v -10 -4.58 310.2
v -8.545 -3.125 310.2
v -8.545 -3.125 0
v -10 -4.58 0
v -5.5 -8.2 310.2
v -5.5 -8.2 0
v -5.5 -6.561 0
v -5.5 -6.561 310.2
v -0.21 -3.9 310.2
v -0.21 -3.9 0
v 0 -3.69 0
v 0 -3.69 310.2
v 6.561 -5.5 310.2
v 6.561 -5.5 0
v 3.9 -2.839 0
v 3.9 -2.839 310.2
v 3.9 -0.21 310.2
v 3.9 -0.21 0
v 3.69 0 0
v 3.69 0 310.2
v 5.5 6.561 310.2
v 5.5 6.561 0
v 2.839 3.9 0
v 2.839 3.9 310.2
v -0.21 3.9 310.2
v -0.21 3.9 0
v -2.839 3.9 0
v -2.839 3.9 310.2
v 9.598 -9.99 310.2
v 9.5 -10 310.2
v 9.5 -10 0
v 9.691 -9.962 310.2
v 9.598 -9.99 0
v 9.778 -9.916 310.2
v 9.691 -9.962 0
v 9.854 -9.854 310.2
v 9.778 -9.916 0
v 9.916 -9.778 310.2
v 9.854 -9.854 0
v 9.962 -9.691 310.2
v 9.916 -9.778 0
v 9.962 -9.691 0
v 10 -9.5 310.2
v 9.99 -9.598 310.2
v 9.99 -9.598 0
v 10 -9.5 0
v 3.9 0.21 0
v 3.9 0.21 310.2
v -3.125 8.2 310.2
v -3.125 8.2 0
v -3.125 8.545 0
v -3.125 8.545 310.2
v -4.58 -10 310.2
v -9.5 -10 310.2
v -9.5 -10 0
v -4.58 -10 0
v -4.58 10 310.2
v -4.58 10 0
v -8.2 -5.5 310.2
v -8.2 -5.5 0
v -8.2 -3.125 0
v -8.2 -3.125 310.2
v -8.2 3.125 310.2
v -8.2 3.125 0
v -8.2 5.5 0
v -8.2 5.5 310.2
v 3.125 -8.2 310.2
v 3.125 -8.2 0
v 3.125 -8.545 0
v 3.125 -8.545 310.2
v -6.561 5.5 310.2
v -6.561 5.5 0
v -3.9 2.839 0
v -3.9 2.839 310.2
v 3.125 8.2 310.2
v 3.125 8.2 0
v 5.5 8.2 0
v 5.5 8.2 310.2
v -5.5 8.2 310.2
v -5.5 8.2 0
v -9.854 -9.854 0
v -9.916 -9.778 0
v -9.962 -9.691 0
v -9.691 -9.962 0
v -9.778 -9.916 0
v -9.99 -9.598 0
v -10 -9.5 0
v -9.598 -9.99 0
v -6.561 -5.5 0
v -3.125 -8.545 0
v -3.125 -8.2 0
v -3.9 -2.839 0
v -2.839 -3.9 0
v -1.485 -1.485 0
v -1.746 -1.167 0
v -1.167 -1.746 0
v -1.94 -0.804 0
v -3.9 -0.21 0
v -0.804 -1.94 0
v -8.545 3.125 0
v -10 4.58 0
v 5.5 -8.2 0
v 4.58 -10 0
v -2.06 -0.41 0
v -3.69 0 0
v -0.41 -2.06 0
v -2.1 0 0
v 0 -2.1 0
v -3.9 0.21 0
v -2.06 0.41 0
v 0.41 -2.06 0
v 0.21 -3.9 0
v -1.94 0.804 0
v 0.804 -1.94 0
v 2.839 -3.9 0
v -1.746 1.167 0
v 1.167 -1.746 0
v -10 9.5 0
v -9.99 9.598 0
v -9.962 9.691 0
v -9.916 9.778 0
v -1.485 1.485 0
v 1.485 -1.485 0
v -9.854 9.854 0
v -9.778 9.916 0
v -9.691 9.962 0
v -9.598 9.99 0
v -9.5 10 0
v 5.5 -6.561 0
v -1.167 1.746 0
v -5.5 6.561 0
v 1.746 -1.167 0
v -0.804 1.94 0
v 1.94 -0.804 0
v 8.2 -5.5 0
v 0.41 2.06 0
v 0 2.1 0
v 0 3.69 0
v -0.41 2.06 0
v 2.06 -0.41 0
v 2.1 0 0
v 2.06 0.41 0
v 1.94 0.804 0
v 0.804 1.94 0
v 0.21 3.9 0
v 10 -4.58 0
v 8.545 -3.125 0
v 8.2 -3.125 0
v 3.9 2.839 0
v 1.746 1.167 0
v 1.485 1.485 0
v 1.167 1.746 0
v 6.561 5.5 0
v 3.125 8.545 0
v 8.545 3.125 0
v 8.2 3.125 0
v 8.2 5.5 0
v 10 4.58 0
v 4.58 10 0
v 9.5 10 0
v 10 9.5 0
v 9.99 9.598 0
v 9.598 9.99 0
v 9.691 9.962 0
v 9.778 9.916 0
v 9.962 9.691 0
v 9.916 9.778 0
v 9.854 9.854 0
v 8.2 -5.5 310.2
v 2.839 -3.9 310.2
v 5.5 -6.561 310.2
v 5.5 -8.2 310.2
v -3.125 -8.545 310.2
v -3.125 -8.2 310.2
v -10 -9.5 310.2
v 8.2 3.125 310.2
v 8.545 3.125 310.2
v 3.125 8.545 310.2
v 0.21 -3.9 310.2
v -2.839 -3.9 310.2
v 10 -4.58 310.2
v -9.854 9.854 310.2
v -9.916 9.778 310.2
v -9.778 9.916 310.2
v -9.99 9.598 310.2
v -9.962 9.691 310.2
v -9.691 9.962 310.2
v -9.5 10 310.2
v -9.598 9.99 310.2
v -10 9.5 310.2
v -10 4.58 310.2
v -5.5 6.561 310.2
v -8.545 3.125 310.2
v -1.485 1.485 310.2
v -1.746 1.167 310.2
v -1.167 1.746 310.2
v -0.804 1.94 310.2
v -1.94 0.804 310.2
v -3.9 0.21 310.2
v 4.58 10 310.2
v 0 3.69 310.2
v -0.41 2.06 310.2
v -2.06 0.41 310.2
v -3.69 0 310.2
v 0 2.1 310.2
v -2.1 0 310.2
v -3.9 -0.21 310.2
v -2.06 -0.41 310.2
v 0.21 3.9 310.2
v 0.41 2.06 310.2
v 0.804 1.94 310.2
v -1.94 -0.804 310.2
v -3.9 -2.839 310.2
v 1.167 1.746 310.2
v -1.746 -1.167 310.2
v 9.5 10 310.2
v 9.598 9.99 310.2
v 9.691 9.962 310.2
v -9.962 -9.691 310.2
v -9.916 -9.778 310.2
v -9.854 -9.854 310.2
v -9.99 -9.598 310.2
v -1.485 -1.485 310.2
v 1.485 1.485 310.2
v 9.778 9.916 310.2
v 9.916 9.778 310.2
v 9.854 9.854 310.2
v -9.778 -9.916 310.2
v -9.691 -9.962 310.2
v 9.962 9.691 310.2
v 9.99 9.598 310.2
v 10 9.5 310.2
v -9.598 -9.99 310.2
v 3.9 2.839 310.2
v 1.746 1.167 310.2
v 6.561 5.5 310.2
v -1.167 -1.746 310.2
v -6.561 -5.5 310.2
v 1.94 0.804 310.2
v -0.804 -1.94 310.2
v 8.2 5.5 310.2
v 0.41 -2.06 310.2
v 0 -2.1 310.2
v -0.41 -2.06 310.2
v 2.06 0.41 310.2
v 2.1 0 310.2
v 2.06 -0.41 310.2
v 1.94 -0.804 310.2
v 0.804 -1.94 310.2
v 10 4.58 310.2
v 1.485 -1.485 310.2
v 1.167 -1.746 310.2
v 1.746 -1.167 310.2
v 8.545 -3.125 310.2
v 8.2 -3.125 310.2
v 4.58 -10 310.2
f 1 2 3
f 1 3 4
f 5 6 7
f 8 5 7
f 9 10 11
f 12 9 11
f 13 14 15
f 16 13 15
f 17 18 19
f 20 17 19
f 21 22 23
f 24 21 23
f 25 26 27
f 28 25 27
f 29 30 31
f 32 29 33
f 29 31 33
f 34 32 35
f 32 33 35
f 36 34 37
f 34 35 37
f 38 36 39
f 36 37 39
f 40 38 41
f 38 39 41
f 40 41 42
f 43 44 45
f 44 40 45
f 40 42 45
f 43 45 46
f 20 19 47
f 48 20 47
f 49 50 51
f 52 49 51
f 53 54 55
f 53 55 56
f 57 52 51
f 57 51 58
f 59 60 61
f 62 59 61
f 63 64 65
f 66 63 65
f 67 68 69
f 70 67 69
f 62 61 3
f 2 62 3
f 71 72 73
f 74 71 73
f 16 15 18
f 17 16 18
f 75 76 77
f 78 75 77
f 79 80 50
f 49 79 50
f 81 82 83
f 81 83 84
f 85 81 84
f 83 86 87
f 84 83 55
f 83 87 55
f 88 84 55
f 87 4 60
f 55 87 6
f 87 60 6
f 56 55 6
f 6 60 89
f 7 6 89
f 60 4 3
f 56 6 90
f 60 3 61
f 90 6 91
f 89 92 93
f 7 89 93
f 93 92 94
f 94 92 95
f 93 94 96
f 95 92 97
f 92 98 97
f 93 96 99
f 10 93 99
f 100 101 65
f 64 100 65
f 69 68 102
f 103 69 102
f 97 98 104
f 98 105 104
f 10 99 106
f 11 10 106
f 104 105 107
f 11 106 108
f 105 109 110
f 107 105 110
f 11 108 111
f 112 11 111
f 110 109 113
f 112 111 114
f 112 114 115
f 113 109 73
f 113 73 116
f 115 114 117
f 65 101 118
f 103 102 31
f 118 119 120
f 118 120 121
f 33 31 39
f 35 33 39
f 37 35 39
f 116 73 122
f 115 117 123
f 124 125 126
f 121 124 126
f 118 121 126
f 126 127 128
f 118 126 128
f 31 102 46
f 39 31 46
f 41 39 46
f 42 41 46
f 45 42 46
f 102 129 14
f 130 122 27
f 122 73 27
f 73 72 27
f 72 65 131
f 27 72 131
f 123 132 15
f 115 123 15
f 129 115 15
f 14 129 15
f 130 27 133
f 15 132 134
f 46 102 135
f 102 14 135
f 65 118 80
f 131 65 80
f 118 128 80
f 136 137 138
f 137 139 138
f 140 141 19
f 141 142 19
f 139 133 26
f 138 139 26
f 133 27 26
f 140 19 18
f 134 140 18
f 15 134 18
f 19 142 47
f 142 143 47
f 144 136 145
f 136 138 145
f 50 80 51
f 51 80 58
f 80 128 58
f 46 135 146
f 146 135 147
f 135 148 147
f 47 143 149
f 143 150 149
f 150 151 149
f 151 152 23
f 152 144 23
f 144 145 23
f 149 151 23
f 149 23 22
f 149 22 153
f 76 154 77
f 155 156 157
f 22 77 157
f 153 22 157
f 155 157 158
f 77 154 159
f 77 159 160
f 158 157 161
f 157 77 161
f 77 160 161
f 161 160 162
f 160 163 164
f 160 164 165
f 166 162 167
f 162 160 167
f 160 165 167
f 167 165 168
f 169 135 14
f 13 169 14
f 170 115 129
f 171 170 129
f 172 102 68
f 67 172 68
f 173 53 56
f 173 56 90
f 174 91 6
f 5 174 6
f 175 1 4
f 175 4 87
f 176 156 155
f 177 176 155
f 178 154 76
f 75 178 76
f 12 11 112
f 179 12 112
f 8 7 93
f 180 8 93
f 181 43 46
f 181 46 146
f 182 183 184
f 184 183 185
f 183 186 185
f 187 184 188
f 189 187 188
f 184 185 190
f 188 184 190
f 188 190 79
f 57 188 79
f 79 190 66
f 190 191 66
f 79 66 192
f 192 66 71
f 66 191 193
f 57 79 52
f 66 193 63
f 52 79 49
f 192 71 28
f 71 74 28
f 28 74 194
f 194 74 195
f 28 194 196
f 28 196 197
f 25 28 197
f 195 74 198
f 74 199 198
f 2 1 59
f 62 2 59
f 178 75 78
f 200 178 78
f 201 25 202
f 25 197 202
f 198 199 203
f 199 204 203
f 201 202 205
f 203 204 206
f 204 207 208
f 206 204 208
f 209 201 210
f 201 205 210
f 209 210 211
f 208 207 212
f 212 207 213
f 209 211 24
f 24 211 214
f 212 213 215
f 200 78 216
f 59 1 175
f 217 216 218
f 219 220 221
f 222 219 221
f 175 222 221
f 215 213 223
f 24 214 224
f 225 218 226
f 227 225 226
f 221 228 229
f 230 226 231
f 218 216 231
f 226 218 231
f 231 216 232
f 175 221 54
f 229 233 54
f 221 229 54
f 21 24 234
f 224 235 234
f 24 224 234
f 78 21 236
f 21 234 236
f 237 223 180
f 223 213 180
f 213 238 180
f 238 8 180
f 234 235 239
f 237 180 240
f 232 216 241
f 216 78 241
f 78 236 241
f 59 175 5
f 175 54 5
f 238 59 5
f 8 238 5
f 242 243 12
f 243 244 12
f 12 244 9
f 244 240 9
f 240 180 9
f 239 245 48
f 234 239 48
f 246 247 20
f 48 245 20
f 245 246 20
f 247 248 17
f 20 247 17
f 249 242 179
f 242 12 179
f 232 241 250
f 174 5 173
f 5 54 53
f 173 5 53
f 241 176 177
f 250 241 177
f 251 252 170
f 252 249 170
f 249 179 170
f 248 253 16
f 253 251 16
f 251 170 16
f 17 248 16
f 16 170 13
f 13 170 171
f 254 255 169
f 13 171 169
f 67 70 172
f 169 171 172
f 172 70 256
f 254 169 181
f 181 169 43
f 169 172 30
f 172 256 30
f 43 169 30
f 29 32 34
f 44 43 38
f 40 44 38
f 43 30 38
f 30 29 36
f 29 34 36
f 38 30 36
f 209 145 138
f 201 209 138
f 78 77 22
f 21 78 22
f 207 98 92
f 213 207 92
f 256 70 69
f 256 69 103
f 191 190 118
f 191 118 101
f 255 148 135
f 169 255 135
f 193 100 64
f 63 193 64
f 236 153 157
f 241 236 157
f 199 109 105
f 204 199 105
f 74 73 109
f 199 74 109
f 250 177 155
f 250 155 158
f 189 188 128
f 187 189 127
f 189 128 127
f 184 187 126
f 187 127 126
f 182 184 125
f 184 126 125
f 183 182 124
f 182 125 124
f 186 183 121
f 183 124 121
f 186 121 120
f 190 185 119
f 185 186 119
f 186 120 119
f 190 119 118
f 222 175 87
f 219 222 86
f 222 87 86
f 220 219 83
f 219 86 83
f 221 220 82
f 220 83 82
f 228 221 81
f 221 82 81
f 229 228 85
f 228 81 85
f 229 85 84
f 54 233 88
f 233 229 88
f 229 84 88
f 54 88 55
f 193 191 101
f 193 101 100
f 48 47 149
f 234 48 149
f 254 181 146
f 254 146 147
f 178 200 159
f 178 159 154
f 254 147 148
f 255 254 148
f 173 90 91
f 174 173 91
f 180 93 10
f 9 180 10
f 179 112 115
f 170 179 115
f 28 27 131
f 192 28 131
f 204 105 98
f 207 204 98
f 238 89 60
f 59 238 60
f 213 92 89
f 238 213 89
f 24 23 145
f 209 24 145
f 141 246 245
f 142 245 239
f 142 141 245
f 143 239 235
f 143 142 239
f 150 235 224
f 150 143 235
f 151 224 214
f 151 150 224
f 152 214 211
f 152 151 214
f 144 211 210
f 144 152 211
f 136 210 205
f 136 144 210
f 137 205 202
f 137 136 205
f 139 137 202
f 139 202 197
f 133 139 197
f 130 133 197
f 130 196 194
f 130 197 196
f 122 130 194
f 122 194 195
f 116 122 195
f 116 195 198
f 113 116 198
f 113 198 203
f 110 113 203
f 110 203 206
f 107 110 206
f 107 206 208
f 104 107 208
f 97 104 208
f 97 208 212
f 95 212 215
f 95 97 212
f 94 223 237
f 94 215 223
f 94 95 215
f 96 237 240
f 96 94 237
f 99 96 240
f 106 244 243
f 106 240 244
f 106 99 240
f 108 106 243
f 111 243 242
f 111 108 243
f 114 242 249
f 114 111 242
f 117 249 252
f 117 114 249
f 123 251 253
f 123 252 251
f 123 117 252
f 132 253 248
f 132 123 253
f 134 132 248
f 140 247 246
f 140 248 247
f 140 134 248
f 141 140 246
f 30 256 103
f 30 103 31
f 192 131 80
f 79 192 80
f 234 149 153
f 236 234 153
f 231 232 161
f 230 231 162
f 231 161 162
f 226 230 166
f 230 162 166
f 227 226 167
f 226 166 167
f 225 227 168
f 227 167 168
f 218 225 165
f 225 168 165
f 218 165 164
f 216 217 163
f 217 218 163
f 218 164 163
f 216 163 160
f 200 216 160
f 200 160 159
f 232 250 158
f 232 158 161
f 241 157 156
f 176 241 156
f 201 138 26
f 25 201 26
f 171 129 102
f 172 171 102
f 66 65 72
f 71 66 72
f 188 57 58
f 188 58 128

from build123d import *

# Parameters (mm, degrees)
V_SLOT_20X20X500_LINEAR_RAIL_BOSS_2_R        = 2.1
V_SLOT_20X20X500_LINEAR_RAIL_BOSS_EXTR_DEPTH = 500
CUT_EXTRUDE1_DEPTH                           = 501.199960016
CUT_EXTRUDE1_DEPTH_BACK                      = 501.199960016
SKETCH1_OUTSIDE_W                            = 122.16
SKETCH1_OUTSIDE_H                            = 602.16
SKETCH1_OUTSIDE_W_2                          = 105.529320626
SKETCH1_OUTSIDE_H_2                          = 310.200000001


# Read off the part's stored shape, not the designer's step: <V-Slot 20x20x500 Linear Rail>-<Boss-Extrude1>
with BuildPart() as part:
    # V-Slot 20x20x500 Linear Rail_-_Boss- 2 → <V-Slot 20x20x500 Linear Rail>-<Boss-Extrude1> (new body)
    with BuildSketch(Plane.XY):
        with BuildLine():
            Line((3.9, -2.839339828), (3.9, -0.21))
            Line((3.9, -0.21), (3.69, 0))
            Line((3.69, 0), (3.9, 0.21))
            Line((3.9, 0.21), (3.9, 2.839339828))
            Line((3.9, 2.839339828), (6.560660172, 5.5))
            Line((6.560660172, 5.5), (8.2, 5.5))
            Line((8.2, 5.5), (8.2, 3.125))
            Line((8.2, 3.125), (8.545, 3.125))
            Line((8.545, 3.125), (10, 4.58))
            Line((10, 4.58), (10, 9.5))
            ThreePointArc((10, 9.5), (9.853553391, 9.853553391), (9.5, 10))
            Line((9.5, 10), (4.58, 10))
            Line((4.58, 10), (3.125, 8.545))
            Line((3.125, 8.545), (3.125, 8.2))
            Line((3.125, 8.2), (5.5, 8.2))
            Line((5.5, 8.2), (5.5, 6.560660172))
            Line((5.5, 6.560660172), (2.839339828, 3.9))
            Line((2.839339828, 3.9), (0.21, 3.9))
            Line((0.21, 3.9), (0, 3.69))
            Line((0, 3.69), (-0.21, 3.9))
            Line((-0.21, 3.9), (-2.839339828, 3.9))
            Line((-2.839339828, 3.9), (-5.5, 6.560660172))
            Line((-5.5, 6.560660172), (-5.5, 8.2))
            Line((-5.5, 8.2), (-3.125, 8.2))
            Line((-3.125, 8.2), (-3.125, 8.545))
            Line((-3.125, 8.545), (-4.58, 10))
            Line((-4.58, 10), (-9.5, 10))
            ThreePointArc((-9.5, 10), (-9.853553391, 9.853553391), (-10, 9.5))
            Line((-10, 9.5), (-10, 4.58))
            Line((-10, 4.58), (-8.545, 3.125))
            Line((-8.545, 3.125), (-8.2, 3.125))
            Line((-8.2, 3.125), (-8.2, 5.5))
            Line((-8.2, 5.5), (-6.560660172, 5.5))
            Line((-6.560660172, 5.5), (-3.9, 2.839339828))
            Line((-3.9, 2.839339828), (-3.9, 0.21))
            Line((-3.9, 0.21), (-3.69, 0))
            Line((-3.69, 0), (-3.9, -0.21))
            Line((-3.9, -0.21), (-3.9, -2.839339828))
            Line((-3.9, -2.839339828), (-6.560660172, -5.5))
            Line((-6.560660172, -5.5), (-8.2, -5.5))
            Line((-8.2, -5.5), (-8.2, -3.125))
            Line((-8.2, -3.125), (-8.545, -3.125))
            Line((-8.545, -3.125), (-10, -4.58))
            Line((-10, -4.58), (-10, -9.5))
            ThreePointArc((-10, -9.5), (-9.853553391, -9.853553391), (-9.5, -10))
            Line((-9.5, -10), (-4.58, -10))
            Line((-4.58, -10), (-3.125, -8.545))
            Line((-3.125, -8.545), (-3.125, -8.2))
            Line((-3.125, -8.2), (-5.5, -8.2))
            Line((-5.5, -8.2), (-5.5, -6.560660172))
            Line((-5.5, -6.560660172), (-2.839339828, -3.9))
            Line((-2.839339828, -3.9), (-0.21, -3.9))
            Line((-0.21, -3.9), (0, -3.69))
            Line((0, -3.69), (0.21, -3.9))
            Line((0.21, -3.9), (2.839339828, -3.9))
            Line((2.839339828, -3.9), (5.5, -6.560660172))
            Line((5.5, -6.560660172), (5.5, -8.2))
            Line((5.5, -8.2), (3.125, -8.2))
            Line((3.125, -8.2), (3.125, -8.545))
            Line((3.125, -8.545), (4.58, -10))
            Line((4.58, -10), (9.5, -10))
            ThreePointArc((9.5, -10), (9.853553391, -9.853553391), (10, -9.5))
            Line((10, -9.5), (10, -4.58))
            Line((10, -4.58), (8.545, -3.125))
            Line((8.545, -3.125), (8.2, -3.125))
            Line((8.2, -3.125), (8.2, -5.5))
            Line((8.2, -5.5), (6.560660172, -5.5))
            Line((6.560660172, -5.5), (3.9, -2.839339828))
        make_face()
        Circle(V_SLOT_20X20X500_LINEAR_RAIL_BOSS_2_R, mode=Mode.SUBTRACT)
    extrude(amount=V_SLOT_20X20X500_LINEAR_RAIL_BOSS_EXTR_DEPTH)

    # Sketch1 outside → Cut-Extrude1 (cut, two sides: drawn at the far end of the back side and taken through both)
    with BuildSketch(Plane(origin=(0, 0, 0), x_dir=(1, 0, 0), z_dir=(0, 1, 0)).offset(-CUT_EXTRUDE1_DEPTH_BACK)):
        with Locations((0, -250)):
            Rectangle(SKETCH1_OUTSIDE_W, SKETCH1_OUTSIDE_H)
        with Locations((0, -155.100000001)):
            Rectangle(SKETCH1_OUTSIDE_W_2, SKETCH1_OUTSIDE_H_2, mode=Mode.SUBTRACT)
    extrude(amount=CUT_EXTRUDE1_DEPTH + CUT_EXTRUDE1_DEPTH_BACK, mode=Mode.SUBTRACT)


solid = part.part
